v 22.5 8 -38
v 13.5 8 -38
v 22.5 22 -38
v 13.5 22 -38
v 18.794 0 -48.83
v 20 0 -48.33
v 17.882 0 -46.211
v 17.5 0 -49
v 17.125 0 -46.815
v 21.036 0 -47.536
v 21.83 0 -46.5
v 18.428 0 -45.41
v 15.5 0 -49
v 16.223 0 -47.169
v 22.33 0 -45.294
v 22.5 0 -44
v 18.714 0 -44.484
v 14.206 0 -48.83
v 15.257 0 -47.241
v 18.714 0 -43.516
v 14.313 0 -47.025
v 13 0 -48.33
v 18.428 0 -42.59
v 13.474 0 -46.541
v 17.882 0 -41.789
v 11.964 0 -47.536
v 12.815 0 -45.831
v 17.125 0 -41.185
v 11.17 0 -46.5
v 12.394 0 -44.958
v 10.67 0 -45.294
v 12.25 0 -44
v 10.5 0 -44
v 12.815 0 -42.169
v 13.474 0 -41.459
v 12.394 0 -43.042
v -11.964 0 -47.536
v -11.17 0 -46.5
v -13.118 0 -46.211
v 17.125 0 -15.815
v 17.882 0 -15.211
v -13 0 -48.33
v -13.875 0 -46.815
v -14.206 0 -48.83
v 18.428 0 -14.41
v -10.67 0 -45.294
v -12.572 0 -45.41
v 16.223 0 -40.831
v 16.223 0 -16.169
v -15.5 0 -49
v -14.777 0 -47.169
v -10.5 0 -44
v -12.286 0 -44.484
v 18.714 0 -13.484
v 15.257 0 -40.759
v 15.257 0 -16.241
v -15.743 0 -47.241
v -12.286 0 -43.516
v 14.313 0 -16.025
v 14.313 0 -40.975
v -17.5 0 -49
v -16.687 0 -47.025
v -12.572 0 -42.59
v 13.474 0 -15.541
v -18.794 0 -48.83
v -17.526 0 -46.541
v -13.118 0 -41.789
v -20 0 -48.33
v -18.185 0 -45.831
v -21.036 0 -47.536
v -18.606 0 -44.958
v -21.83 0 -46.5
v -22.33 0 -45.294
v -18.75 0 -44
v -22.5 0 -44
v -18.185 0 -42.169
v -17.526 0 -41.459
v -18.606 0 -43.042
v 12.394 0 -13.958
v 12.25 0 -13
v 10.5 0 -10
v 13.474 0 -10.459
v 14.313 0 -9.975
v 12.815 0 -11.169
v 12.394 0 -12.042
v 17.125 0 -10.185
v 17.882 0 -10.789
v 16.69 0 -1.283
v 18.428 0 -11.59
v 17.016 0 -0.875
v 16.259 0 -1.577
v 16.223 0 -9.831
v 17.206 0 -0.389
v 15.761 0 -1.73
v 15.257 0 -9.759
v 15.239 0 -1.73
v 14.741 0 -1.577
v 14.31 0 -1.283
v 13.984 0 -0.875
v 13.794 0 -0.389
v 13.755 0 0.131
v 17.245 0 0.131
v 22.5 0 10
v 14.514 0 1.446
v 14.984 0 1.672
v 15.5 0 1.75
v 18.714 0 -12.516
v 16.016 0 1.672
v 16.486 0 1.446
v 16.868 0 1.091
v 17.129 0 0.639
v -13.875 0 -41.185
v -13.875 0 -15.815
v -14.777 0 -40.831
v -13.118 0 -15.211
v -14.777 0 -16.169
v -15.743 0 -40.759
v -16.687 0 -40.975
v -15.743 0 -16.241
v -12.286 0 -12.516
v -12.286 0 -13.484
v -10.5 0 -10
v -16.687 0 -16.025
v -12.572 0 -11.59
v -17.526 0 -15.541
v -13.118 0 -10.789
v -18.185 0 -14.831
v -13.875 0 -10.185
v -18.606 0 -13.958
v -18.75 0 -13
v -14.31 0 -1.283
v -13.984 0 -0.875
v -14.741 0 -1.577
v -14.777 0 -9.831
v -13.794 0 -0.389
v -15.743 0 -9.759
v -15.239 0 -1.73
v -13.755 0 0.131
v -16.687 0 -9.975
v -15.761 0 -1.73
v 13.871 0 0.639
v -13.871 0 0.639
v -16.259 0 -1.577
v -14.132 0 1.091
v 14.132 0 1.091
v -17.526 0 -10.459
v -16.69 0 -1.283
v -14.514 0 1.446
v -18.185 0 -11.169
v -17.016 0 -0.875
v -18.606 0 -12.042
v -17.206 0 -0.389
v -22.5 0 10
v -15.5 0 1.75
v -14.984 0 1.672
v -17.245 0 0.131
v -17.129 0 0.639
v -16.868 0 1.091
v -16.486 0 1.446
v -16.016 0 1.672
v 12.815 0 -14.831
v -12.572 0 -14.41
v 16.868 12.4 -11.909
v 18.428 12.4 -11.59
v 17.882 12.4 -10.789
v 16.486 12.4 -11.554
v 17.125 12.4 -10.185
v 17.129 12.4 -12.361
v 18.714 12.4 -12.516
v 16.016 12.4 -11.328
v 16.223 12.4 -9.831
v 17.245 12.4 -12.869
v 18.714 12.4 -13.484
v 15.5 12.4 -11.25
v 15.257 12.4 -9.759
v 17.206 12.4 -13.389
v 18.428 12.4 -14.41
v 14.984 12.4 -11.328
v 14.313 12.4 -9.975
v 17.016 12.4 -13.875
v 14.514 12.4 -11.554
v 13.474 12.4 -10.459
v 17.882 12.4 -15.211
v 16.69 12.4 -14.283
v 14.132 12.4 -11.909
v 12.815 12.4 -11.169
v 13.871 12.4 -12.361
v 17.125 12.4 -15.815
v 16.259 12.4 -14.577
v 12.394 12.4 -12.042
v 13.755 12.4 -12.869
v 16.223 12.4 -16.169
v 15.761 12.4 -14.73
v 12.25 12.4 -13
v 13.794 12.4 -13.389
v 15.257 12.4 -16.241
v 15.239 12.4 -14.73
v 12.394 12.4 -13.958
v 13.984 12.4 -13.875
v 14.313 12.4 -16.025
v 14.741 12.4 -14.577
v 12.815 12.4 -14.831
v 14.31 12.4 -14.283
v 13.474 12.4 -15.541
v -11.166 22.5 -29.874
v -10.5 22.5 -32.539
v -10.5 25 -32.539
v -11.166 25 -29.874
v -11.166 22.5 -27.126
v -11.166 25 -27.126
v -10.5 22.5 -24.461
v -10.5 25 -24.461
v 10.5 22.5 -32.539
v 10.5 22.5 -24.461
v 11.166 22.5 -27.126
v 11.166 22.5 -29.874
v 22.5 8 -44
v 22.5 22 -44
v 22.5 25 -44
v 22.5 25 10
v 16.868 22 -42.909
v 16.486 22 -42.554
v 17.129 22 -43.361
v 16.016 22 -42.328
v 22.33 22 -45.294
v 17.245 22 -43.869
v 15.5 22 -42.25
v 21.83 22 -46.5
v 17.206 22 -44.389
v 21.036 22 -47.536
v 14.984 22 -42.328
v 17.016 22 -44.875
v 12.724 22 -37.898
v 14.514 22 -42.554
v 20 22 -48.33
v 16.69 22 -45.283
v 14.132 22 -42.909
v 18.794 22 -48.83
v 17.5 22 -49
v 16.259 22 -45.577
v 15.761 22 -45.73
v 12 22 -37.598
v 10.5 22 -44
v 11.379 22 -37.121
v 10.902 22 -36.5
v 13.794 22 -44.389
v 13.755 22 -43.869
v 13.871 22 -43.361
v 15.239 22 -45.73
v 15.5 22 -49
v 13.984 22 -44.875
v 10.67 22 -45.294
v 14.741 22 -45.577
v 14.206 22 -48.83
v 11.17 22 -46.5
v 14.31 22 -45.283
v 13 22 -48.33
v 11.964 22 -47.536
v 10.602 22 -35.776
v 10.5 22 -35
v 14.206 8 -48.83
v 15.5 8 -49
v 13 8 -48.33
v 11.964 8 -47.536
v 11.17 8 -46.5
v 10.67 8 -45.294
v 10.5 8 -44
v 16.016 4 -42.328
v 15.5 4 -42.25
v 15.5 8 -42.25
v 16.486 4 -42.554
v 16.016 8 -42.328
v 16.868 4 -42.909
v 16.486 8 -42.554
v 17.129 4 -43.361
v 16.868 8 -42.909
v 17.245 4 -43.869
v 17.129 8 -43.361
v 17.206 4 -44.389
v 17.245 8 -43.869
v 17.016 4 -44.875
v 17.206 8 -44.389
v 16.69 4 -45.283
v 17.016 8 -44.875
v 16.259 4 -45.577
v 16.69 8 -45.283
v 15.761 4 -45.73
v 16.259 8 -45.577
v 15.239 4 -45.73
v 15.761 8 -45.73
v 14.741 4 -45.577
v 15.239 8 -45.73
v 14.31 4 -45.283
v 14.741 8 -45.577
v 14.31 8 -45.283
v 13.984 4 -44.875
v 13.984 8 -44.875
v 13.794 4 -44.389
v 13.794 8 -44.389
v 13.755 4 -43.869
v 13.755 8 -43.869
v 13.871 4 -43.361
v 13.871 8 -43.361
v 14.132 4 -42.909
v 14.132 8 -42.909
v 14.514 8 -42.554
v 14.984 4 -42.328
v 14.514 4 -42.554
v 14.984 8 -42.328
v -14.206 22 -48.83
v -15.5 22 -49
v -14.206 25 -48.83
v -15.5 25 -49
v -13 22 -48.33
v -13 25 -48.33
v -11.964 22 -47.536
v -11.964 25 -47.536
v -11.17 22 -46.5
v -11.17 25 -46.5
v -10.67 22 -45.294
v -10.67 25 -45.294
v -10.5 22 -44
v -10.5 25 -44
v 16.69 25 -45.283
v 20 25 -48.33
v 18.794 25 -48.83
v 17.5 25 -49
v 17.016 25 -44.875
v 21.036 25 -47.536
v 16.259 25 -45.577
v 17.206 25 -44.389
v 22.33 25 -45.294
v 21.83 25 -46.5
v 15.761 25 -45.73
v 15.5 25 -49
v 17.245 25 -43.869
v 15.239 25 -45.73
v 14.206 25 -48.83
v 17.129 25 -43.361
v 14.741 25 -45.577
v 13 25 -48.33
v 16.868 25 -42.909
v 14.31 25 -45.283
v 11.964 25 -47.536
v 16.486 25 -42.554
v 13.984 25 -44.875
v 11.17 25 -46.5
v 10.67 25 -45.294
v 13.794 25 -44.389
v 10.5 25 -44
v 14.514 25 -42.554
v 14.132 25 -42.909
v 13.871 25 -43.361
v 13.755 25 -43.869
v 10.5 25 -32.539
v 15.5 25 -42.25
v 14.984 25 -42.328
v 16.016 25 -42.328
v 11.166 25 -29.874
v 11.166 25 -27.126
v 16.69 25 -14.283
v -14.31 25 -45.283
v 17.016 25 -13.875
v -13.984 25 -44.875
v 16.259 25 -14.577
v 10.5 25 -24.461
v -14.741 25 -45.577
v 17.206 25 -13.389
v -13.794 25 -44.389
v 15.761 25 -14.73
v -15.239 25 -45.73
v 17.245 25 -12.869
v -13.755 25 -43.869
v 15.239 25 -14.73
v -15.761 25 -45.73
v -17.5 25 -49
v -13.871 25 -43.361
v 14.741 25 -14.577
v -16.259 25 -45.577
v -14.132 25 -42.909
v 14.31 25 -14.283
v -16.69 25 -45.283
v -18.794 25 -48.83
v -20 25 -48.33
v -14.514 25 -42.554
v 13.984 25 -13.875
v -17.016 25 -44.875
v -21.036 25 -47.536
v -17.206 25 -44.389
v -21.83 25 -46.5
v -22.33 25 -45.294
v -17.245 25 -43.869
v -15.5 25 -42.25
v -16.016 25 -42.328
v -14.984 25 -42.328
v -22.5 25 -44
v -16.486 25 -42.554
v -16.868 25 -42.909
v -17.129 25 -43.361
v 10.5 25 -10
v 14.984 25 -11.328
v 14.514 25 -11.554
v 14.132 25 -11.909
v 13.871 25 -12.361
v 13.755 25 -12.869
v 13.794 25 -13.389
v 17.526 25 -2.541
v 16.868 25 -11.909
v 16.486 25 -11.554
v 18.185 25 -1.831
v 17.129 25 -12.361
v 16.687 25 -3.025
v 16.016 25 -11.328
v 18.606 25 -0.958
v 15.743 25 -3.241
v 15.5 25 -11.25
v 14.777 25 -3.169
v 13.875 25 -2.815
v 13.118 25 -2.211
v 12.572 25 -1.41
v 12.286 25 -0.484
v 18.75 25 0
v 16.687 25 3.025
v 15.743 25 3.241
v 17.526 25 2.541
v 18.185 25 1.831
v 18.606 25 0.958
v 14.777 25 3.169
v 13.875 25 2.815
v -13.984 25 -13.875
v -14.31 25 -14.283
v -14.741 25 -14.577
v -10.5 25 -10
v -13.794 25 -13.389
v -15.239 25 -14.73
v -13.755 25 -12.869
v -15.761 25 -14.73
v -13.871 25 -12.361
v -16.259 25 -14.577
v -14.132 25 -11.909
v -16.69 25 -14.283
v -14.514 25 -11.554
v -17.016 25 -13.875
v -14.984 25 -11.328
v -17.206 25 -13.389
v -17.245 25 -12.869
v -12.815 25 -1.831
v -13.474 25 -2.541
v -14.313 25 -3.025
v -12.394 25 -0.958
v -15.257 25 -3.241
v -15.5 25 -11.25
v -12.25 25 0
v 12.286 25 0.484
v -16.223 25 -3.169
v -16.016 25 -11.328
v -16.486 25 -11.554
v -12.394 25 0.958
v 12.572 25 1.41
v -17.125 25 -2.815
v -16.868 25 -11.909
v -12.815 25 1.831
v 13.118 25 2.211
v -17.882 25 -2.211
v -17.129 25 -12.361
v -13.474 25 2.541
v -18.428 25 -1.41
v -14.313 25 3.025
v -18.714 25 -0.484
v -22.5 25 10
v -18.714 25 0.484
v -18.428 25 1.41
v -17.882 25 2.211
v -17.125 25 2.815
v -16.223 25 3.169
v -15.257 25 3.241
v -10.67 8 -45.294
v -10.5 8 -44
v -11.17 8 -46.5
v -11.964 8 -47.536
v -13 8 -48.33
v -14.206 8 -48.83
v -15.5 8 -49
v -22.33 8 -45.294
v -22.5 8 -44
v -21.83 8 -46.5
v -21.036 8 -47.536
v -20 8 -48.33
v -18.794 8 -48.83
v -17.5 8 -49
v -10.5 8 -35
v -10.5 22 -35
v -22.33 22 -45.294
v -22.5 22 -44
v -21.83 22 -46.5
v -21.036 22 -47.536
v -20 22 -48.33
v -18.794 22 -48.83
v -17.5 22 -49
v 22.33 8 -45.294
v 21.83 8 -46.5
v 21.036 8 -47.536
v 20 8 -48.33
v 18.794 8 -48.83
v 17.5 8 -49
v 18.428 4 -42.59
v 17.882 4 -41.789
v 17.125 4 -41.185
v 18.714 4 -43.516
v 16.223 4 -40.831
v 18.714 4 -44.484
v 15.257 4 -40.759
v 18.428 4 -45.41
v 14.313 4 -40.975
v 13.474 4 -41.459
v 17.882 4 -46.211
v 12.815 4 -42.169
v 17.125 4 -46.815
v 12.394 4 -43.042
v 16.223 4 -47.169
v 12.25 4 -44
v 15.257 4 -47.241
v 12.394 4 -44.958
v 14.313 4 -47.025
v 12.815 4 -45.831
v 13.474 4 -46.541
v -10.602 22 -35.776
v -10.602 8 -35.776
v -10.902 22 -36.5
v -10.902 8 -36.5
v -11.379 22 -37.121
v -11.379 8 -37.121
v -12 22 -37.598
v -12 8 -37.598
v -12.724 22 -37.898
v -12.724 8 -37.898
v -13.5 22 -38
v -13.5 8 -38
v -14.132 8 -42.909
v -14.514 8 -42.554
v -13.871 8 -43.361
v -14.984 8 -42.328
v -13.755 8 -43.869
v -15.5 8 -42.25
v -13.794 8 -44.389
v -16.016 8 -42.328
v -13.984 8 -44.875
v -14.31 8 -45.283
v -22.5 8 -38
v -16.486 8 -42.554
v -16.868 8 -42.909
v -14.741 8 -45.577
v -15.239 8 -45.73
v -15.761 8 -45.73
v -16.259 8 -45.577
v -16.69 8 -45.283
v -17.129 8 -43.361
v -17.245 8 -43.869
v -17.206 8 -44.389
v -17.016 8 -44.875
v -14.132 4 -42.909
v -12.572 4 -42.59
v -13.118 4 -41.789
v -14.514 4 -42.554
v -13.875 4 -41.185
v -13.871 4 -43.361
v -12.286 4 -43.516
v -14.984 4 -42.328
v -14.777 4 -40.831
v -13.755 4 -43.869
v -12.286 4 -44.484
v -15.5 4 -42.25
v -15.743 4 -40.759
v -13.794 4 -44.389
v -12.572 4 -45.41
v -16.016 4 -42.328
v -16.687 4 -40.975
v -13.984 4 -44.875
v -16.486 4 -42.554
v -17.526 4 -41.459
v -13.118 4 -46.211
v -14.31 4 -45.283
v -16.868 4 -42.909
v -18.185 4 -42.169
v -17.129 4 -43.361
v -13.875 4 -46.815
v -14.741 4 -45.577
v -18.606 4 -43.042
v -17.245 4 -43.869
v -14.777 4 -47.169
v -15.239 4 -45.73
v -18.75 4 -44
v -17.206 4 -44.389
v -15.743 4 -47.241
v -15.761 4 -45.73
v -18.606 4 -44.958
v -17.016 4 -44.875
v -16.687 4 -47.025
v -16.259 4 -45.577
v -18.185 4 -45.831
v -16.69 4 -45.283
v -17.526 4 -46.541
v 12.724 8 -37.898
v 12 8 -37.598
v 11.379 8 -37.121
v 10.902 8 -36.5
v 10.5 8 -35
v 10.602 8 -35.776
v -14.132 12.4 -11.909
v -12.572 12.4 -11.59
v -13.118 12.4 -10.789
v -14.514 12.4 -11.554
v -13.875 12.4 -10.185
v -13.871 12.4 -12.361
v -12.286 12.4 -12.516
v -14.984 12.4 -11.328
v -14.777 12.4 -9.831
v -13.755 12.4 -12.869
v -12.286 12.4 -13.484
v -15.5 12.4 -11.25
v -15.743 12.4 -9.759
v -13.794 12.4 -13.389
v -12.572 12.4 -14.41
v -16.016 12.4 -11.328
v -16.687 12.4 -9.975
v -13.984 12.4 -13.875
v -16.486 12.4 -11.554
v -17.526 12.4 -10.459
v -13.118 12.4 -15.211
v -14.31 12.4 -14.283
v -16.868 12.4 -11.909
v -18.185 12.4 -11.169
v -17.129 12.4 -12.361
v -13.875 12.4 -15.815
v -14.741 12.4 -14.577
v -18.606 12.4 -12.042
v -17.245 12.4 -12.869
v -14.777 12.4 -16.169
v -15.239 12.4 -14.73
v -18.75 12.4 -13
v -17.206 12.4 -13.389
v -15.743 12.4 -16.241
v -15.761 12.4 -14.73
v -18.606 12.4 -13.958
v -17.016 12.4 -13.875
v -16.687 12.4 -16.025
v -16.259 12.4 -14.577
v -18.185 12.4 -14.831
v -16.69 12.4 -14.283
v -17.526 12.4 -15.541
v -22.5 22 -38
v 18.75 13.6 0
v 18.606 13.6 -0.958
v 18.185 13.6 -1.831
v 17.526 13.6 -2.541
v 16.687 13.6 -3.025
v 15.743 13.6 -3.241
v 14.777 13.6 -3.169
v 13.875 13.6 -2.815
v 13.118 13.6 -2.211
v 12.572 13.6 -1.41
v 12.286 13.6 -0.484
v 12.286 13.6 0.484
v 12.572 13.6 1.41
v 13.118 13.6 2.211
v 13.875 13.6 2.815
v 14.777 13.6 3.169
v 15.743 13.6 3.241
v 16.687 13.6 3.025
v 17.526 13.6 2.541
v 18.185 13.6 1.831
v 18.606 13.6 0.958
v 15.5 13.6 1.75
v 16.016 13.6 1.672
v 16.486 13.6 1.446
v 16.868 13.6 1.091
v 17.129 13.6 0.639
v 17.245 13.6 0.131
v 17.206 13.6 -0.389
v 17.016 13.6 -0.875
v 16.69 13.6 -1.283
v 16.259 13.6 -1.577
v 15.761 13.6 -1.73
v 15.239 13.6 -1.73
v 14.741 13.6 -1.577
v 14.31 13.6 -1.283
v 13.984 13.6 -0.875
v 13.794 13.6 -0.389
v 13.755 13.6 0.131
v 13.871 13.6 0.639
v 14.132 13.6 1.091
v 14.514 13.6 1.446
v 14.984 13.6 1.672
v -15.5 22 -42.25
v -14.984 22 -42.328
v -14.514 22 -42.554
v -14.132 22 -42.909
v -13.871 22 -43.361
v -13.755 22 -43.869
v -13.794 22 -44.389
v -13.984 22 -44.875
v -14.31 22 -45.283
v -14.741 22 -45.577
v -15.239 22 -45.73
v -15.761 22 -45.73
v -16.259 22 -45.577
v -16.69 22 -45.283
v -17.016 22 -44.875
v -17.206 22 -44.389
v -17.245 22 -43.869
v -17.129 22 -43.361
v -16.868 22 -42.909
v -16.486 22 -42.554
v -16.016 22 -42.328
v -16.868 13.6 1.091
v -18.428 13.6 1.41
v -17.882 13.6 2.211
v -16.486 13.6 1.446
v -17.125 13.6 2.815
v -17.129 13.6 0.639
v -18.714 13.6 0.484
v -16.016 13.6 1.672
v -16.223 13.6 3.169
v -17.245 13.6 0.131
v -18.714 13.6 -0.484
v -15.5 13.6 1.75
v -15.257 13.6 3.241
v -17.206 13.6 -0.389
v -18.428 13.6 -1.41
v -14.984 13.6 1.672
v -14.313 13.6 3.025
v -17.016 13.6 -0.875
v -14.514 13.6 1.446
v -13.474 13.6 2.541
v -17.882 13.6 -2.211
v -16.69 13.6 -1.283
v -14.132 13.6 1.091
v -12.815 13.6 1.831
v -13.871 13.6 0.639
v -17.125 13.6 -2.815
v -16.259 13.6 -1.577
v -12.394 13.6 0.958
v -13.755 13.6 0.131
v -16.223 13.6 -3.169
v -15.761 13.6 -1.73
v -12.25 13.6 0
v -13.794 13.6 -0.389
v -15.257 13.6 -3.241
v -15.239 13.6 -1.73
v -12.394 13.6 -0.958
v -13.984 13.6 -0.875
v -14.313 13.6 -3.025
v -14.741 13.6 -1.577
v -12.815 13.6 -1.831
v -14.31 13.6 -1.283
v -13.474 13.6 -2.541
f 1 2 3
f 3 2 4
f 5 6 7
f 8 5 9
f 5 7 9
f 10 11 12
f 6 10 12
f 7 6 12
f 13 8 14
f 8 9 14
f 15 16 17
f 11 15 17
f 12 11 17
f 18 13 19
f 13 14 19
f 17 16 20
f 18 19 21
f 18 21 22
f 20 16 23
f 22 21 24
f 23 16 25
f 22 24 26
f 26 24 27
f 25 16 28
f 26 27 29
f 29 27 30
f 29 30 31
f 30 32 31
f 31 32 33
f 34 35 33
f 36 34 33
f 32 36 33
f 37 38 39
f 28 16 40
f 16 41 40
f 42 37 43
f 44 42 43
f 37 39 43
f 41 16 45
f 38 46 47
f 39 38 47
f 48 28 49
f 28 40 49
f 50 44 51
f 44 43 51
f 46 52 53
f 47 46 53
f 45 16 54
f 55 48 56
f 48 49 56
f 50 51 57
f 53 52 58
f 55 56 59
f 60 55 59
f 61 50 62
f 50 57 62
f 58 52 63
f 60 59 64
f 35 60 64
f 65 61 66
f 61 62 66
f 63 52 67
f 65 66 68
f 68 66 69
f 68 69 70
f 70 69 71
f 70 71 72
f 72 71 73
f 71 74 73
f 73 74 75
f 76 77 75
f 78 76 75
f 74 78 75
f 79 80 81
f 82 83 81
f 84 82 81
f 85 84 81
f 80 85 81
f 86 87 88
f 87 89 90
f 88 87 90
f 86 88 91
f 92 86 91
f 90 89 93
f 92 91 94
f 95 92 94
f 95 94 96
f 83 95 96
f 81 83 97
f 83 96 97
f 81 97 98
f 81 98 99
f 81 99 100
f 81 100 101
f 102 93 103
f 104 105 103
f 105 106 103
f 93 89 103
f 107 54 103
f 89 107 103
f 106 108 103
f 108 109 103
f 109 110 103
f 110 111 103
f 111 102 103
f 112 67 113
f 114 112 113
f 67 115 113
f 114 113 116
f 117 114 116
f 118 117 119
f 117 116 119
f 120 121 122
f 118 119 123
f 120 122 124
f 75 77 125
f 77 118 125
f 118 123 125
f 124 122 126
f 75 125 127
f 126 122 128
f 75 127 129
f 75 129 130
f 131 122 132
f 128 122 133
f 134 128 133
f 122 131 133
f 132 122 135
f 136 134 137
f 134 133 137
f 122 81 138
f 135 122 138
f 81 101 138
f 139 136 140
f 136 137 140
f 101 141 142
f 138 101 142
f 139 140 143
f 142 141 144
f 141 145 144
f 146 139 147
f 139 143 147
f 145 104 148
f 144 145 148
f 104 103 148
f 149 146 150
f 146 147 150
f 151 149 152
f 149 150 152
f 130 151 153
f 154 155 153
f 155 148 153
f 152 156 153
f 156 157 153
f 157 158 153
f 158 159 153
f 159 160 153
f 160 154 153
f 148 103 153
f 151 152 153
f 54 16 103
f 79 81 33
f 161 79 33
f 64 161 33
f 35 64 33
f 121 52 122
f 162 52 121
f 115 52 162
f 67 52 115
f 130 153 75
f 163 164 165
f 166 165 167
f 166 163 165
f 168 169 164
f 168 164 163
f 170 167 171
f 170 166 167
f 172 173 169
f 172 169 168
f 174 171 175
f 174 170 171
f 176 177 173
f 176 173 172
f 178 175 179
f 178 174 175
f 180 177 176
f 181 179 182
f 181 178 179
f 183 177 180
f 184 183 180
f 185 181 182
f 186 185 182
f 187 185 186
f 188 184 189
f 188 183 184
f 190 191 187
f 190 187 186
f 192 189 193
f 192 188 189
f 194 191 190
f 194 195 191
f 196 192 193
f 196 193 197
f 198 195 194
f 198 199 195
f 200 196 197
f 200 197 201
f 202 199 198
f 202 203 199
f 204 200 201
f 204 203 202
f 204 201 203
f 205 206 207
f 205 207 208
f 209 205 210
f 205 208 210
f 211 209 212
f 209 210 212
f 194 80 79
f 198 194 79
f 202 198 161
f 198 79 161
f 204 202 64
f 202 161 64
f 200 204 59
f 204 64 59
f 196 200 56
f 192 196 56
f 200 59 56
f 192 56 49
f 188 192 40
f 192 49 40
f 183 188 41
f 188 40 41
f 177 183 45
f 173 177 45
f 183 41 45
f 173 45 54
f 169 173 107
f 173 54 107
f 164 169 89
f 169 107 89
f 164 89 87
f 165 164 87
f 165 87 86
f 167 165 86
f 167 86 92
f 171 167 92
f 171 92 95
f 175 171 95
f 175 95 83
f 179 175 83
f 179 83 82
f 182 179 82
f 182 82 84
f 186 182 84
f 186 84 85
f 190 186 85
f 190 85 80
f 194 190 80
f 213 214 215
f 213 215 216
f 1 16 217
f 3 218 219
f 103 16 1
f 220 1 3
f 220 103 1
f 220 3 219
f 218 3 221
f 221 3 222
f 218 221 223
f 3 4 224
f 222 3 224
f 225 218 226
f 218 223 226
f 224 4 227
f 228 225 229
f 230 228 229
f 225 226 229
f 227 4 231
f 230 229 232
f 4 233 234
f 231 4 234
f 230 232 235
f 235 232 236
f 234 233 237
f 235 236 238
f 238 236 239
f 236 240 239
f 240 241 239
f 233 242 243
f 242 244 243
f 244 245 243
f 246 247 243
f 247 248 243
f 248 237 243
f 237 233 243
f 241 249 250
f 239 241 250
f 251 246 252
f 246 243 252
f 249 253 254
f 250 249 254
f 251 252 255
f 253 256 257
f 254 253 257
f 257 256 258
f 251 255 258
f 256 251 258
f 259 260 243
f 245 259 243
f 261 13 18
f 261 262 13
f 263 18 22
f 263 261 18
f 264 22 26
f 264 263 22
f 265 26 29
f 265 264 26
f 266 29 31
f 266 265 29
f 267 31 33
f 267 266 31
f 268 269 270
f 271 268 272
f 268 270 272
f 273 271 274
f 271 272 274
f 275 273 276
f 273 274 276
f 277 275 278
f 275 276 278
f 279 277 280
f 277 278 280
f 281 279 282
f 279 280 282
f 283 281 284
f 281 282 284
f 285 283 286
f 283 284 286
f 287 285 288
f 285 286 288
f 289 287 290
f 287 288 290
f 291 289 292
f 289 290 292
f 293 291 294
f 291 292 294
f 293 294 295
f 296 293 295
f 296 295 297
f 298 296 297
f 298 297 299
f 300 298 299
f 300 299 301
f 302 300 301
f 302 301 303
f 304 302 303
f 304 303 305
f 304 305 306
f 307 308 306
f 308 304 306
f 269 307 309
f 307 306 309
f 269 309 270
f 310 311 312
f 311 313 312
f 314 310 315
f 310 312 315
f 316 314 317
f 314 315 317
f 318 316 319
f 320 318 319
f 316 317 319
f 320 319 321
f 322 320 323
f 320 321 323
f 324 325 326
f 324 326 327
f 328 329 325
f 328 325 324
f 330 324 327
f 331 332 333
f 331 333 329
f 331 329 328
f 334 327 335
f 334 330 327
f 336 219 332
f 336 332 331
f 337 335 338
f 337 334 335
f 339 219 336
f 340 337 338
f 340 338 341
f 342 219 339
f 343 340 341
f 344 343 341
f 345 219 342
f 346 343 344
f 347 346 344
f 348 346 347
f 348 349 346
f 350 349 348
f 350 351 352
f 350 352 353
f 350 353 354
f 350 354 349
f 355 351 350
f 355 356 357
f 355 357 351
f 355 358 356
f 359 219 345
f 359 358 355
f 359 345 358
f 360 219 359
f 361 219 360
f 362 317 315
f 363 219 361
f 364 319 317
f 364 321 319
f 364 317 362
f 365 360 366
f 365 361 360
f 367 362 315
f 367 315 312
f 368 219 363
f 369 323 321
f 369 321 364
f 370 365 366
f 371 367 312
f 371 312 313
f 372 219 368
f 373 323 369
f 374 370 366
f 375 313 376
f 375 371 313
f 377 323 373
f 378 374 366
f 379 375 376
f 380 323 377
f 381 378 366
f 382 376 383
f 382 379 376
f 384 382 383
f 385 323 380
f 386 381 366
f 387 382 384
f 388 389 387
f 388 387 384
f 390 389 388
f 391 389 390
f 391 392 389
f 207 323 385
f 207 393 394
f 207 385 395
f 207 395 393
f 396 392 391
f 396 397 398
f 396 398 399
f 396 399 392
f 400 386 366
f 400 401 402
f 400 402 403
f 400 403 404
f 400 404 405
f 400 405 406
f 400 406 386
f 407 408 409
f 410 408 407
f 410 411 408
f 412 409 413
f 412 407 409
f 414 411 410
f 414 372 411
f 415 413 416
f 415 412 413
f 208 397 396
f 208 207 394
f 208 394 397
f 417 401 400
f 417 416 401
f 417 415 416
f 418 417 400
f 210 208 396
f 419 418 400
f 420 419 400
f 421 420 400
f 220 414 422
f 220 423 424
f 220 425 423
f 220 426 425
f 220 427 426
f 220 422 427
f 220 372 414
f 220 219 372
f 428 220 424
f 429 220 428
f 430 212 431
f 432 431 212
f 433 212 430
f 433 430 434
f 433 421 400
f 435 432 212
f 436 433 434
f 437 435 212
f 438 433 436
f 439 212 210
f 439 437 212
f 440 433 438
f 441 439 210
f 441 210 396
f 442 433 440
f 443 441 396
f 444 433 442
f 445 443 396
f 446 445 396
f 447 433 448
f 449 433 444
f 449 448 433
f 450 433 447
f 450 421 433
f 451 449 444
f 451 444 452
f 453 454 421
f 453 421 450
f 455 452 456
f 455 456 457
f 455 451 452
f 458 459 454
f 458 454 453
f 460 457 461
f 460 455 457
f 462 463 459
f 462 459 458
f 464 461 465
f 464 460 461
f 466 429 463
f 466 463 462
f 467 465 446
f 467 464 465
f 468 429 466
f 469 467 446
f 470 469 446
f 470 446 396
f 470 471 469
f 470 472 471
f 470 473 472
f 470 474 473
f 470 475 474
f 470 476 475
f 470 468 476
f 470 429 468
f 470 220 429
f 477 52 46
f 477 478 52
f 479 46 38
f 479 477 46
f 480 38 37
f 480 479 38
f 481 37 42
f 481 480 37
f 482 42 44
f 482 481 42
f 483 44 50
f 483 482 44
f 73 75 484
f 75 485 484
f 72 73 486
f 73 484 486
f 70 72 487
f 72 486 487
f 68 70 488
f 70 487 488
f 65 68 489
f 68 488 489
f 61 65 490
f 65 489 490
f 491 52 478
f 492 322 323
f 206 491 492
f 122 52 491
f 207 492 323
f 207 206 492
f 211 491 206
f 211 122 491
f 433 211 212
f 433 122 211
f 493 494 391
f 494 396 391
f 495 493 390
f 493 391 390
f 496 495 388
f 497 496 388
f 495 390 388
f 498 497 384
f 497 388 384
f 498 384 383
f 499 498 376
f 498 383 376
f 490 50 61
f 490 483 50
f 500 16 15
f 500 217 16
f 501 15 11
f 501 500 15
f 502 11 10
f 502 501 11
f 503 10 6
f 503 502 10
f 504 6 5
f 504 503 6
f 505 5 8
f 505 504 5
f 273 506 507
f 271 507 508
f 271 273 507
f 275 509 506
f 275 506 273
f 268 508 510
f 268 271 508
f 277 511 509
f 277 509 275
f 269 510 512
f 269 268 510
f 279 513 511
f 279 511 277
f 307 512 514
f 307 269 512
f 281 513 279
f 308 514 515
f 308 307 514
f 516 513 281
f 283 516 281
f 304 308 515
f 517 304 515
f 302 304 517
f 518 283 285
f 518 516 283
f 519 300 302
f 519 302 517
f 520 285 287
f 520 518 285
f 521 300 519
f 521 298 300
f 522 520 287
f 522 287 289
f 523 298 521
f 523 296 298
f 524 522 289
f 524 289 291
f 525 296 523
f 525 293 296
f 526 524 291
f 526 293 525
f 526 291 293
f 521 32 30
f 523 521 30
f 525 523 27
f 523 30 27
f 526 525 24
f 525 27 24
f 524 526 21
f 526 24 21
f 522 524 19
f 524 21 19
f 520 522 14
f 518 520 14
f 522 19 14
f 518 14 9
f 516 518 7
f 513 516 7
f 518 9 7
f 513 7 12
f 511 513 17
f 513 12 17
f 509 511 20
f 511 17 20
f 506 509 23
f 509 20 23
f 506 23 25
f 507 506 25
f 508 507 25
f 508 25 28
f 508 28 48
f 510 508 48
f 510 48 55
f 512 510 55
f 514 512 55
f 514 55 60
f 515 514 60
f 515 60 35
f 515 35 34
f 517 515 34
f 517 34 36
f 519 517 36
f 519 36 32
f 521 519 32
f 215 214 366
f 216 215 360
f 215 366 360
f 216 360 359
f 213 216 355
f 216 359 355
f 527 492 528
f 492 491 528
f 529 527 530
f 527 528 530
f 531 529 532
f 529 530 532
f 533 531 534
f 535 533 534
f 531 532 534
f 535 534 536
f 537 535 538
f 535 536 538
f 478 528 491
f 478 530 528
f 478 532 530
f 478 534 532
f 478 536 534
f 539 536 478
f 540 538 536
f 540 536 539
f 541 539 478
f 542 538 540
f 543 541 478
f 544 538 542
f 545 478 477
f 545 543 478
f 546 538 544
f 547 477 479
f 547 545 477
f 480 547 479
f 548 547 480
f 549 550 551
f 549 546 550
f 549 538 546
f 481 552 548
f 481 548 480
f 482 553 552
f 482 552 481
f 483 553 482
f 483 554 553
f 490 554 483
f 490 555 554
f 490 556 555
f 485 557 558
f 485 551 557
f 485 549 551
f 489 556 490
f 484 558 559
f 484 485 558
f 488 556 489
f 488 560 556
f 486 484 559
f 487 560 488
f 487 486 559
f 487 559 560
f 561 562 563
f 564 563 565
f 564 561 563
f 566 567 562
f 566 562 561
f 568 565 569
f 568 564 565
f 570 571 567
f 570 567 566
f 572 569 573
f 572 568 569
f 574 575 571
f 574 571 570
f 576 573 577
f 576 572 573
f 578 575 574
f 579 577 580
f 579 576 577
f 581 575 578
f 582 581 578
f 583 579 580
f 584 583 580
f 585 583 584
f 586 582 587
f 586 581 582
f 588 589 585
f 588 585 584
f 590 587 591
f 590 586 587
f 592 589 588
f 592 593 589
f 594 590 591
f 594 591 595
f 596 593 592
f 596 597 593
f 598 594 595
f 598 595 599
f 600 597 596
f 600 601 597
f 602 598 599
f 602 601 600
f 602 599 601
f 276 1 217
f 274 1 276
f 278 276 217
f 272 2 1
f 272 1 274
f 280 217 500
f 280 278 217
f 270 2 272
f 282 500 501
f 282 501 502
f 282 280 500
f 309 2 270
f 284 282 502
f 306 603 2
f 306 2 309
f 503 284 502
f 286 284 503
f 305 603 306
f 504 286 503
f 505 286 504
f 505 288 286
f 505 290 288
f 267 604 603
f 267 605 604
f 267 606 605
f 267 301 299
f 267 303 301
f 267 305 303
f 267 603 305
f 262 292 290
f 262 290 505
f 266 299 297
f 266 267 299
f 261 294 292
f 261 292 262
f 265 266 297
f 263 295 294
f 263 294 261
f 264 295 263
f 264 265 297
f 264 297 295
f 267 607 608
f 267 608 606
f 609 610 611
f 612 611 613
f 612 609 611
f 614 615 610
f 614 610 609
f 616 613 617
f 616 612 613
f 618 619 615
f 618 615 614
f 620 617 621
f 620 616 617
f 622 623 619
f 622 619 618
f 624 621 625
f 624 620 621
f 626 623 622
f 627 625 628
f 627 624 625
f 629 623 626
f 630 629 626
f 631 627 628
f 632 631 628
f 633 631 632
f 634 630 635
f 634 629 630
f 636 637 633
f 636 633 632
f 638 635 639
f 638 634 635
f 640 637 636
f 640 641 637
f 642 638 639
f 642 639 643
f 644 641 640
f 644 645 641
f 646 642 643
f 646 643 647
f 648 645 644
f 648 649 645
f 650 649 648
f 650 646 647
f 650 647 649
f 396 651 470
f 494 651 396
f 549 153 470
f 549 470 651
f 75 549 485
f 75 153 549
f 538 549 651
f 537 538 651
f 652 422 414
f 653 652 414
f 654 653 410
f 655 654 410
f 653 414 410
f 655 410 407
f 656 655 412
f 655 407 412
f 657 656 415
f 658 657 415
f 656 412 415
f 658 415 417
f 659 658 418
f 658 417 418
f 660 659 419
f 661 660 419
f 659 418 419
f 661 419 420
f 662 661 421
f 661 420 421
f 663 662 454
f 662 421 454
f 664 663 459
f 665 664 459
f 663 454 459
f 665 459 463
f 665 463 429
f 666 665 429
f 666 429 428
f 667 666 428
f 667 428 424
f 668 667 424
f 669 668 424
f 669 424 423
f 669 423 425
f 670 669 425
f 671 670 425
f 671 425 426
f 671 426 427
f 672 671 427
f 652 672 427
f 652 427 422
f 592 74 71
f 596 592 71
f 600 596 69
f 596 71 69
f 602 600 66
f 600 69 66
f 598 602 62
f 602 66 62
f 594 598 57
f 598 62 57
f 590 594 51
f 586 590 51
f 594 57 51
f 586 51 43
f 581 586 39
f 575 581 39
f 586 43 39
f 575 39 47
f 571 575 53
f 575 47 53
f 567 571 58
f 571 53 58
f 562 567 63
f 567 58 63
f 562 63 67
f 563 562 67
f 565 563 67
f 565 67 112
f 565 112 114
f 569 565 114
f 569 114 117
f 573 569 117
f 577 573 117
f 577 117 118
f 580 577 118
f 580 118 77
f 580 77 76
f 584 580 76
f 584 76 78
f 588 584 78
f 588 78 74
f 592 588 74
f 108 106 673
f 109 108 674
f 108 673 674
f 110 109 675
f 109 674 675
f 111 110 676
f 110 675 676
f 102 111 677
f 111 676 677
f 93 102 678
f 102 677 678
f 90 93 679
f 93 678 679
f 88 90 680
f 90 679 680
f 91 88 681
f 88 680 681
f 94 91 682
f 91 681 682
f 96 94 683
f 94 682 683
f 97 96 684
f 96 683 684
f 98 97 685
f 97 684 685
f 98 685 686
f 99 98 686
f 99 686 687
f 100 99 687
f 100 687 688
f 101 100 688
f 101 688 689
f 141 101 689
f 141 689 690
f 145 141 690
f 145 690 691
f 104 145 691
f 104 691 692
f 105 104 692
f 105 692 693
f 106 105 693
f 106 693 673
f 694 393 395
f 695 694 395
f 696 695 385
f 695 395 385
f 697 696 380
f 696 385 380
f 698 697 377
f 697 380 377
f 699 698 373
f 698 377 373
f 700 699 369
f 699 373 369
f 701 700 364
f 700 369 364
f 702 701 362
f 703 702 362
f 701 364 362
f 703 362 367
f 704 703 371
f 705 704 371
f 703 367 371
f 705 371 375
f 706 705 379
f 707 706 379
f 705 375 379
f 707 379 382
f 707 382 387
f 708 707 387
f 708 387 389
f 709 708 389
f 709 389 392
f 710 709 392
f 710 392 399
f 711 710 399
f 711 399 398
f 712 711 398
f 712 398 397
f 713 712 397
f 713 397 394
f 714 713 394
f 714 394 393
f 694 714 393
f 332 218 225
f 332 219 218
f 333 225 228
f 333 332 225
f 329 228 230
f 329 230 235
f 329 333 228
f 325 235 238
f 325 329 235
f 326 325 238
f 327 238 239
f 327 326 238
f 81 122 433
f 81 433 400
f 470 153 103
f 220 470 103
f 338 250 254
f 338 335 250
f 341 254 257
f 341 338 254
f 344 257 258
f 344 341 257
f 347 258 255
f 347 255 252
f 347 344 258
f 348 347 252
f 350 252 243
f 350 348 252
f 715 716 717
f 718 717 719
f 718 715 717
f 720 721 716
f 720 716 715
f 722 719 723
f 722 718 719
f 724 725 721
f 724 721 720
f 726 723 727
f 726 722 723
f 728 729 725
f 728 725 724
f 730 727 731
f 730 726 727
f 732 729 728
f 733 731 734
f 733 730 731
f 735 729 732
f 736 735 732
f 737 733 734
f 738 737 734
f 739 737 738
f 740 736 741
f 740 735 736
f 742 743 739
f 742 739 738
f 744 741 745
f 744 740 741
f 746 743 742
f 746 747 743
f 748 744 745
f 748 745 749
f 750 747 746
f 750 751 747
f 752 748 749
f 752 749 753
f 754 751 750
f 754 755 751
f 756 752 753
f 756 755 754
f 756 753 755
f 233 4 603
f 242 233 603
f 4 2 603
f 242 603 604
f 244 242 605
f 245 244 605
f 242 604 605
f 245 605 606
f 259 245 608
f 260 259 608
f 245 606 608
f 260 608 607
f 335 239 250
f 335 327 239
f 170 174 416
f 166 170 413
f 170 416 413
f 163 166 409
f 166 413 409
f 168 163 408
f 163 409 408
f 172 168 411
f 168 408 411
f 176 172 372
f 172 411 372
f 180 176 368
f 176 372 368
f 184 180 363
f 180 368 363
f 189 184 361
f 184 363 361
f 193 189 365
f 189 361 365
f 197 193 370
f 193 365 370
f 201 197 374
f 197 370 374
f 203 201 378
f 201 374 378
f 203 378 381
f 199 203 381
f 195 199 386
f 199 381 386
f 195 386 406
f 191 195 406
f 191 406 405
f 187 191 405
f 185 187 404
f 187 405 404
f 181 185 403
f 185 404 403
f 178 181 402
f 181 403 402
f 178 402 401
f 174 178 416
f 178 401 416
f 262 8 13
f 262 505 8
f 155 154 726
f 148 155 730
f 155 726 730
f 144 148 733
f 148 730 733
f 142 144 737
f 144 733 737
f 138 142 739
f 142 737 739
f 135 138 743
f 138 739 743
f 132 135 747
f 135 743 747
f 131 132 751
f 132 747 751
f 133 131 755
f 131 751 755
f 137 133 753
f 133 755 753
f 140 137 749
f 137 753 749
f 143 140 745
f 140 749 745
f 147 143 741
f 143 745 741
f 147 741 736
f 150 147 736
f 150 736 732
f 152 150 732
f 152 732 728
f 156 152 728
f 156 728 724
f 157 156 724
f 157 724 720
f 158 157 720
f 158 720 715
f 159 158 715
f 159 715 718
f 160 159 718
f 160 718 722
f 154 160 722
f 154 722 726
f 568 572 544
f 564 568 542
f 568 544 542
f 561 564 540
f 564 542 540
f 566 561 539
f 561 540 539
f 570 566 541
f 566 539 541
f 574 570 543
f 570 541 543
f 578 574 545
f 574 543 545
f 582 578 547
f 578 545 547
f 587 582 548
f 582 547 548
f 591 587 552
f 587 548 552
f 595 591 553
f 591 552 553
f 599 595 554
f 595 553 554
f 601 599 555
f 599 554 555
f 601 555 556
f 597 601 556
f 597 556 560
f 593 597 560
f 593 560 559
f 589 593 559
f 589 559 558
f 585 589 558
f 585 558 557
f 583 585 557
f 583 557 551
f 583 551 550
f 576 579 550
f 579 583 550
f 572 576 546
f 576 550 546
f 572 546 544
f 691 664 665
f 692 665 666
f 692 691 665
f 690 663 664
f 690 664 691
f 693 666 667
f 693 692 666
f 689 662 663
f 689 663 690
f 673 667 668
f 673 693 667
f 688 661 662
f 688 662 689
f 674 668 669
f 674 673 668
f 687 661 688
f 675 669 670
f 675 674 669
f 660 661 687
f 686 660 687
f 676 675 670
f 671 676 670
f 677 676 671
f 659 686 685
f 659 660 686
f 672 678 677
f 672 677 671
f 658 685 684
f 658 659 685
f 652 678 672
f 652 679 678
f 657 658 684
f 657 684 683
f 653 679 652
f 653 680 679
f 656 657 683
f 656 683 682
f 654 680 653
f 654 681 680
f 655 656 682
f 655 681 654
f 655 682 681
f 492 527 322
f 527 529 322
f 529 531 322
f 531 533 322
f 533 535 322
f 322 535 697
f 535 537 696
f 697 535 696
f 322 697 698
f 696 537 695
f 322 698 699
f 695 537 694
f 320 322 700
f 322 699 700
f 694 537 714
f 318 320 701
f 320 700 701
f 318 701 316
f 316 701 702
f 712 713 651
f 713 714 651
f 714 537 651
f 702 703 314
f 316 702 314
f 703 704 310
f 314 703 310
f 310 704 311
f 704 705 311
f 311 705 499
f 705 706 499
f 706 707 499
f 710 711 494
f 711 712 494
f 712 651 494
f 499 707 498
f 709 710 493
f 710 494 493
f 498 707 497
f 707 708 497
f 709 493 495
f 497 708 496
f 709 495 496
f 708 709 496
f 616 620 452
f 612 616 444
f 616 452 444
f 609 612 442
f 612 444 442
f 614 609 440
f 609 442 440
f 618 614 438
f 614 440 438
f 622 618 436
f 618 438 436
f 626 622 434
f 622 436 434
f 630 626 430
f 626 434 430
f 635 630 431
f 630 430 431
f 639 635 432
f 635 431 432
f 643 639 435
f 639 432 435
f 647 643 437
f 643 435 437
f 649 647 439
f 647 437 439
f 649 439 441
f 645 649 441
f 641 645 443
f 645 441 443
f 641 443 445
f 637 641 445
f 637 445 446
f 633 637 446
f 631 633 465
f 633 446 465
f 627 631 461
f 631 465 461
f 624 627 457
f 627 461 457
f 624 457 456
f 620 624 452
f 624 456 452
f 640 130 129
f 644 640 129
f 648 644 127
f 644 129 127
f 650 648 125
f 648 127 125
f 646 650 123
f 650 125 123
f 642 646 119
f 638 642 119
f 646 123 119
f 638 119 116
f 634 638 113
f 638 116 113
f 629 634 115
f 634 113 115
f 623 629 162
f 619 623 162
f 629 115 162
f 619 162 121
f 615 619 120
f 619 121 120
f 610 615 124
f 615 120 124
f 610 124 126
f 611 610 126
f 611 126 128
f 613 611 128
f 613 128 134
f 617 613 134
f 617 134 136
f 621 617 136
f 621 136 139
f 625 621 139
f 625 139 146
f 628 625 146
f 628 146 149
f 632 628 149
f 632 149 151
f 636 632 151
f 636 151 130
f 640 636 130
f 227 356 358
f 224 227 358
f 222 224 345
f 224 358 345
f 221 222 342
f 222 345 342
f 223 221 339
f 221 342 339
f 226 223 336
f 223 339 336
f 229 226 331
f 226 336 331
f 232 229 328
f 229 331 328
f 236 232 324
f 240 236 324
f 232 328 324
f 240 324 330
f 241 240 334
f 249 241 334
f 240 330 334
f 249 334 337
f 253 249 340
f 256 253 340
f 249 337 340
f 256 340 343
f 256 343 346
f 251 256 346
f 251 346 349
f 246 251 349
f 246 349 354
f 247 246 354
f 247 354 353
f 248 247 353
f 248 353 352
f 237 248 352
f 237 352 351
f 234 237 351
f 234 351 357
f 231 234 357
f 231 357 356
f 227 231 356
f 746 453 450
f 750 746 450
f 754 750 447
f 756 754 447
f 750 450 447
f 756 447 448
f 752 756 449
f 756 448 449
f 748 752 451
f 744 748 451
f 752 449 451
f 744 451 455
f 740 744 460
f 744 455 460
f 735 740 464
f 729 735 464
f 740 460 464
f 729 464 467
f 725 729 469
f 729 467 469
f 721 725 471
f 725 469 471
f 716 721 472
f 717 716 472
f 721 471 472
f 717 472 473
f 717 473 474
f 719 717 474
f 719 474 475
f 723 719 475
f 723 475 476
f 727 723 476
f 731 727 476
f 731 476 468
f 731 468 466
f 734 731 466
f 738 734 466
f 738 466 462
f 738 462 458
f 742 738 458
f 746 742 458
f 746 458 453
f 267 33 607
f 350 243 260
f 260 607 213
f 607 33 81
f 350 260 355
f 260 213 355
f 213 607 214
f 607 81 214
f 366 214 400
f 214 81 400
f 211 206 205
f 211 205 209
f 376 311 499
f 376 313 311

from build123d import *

# Parameters (mm, degrees)
SKETCH1_W                                           = 45
SKETCH1_H                                           = 20
BOSS_EXTRUDE1_DEPTH                                 = 25
SKETCH2_W                                           = 12
SKETCH2_H                                           = 25
BOSS_EXTRUDE2_DEPTH                                 = 40
SKETCH3_R                                           = 1.75
CUT_EXTRUDE1_DEPTH                                  = 61.259853966
SKETCH4_R                                           = 1.75
CUT_EXTRUDE2_DEPTH                                  = 25
CBORE_FOR_M3_HEX_SOCKET_HEAD_CAP_SCREW1_D           = 3.5
CBORE_FOR_M3_HEX_SOCKET_HEAD_CAP_SCREW1_CBORE_D     = 6.5
CBORE_FOR_M3_HEX_SOCKET_HEAD_CAP_SCREW1_CBORE_DEPTH = 11.4
CBORE_FOR_M3_HEX_SOCKET_HEAD_CAP_SCREW2_D           = 3.5
CBORE_FOR_M3_HEX_SOCKET_HEAD_CAP_SCREW2_CBORE_D     = 6.5
CBORE_FOR_M3_HEX_SOCKET_HEAD_CAP_SCREW2_CBORE_DEPTH = 4
CBORE_FOR_M3_PAN_HEAD_SCREW1_D                      = 3.5
CBORE_FOR_M3_PAN_HEAD_SCREW1_CBORE_D                = 6.5
CBORE_FOR_M3_PAN_HEAD_SCREW1_CBORE_DEPTH            = 12.4
CUT_EXTRUDE3_DEPTH                                  = 72.763500472
CUT_EXTRUDE3_DEPTH_BACK                             = 72.763500472
SKETCH9_W                                           = 12
SKETCH9_H                                           = 14
SKETCH10_W                                          = 12
SKETCH10_H                                          = 8
SKETCH10_H_2                                        = 3
CUT_EXTRUDE5_DEPTH                                  = 1
FILLET2_R                                           = 5
FILLET5_R                                           = 3
SKETCH13_R                                          = 11.25
CUT_EXTRUDE6_DEPTH                                  = 2.5


with BuildPart() as part:
    # Sketch1 → Boss-Extrude1 (new body)
    with BuildSketch(Plane(origin=(0, 0, 0), x_dir=(1, 0, 0), z_dir=(0, 1, 0))):
        Rectangle(SKETCH1_W, SKETCH1_H)
    extrude(amount=BOSS_EXTRUDE1_DEPTH)

    # Sketch2 → Boss-Extrude2 (add)
    with BuildSketch(Plane(origin=(0, 0, -10), x_dir=(-1, 0, 0), z_dir=(0, 0, -1))):
        with Locations((-16.5, 12.5)):
            Rectangle(SKETCH2_W, SKETCH2_H)
        with Locations((16.5, 12.5)):
            Rectangle(SKETCH2_W, SKETCH2_H)
    extrude(amount=BOSS_EXTRUDE2_DEPTH)

    # Sketch3 → Cut-Extrude1 (cut, through all)
    with BuildSketch(Plane(origin=(0, 25, 0), x_dir=(1, 0, 0), z_dir=(0, 1, 0))):
        with Locations(Location((15.5, 44, 0), (0, 0, 270))):
            Circle(SKETCH3_R)
        with Locations(Location((15.5, 13, 0), (0, 0, 270))):
            Circle(SKETCH3_R)
        with Locations(Location((-15.5, 13, 0), (0, 0, 270))):
            Circle(SKETCH3_R)
        with Locations(Location((-15.5, 44, 0), (0, 0, 270))):
            Circle(SKETCH3_R)
    extrude(amount=-CUT_EXTRUDE1_DEPTH, mode=Mode.SUBTRACT)

    # Sketch4 → Cut-Extrude2 (cut)
    with BuildSketch(Plane(origin=(0, 25, 0), x_dir=(1, 0, 0), z_dir=(0, 1, 0))):
        with Locations(Location((-15.5, 0, 0), (0, 0, 270))):
            Circle(SKETCH4_R)
        with Locations(Location((15.5, 0, 0), (0, 0, 270))):
            Circle(SKETCH4_R)
    extrude(amount=-CUT_EXTRUDE2_DEPTH, mode=Mode.SUBTRACT)

    # CBORE for M3 Hex Socket Head Cap Screw1 (through all)
    with Locations(Plane(origin=(0, 25, 0), x_dir=(1, 0, 0), z_dir=(0, 1, 0))):
        with Locations((15.5, 0), (-15.5, 0)):
            CounterBoreHole(CBORE_FOR_M3_HEX_SOCKET_HEAD_CAP_SCREW1_D / 2, CBORE_FOR_M3_HEX_SOCKET_HEAD_CAP_SCREW1_CBORE_D / 2, CBORE_FOR_M3_HEX_SOCKET_HEAD_CAP_SCREW1_CBORE_DEPTH)

    # CBORE for M3 Hex Socket Head Cap Screw2 (through all)
    with Locations(Plane(origin=(0, 0, 0), x_dir=(-1, 0, 0), z_dir=(0, -1, 0))):
        with Locations((15.5, 44), (15.5, 13), (-15.5, 13), (-15.5, 44)):
            CounterBoreHole(CBORE_FOR_M3_HEX_SOCKET_HEAD_CAP_SCREW2_D / 2, CBORE_FOR_M3_HEX_SOCKET_HEAD_CAP_SCREW2_CBORE_D / 2, CBORE_FOR_M3_HEX_SOCKET_HEAD_CAP_SCREW2_CBORE_DEPTH)

    # CBORE for M3 Pan Head Screw1 (through all)
    with Locations(Plane(origin=(0, 0, 0), x_dir=(-1, 0, 0), z_dir=(0, -1, 0))):
        with Locations((-15.5, 13), (15.5, 13)):
            CounterBoreHole(CBORE_FOR_M3_PAN_HEAD_SCREW1_D / 2, CBORE_FOR_M3_PAN_HEAD_SCREW1_CBORE_D / 2, CBORE_FOR_M3_PAN_HEAD_SCREW1_CBORE_DEPTH)

    # Sketch9 → Cut-Extrude3 (cut, two sides: drawn at the far end of the back side and taken through both)
    with BuildSketch(Plane(origin=(22.5, 0, 0), x_dir=(0, 0, -1), z_dir=(1, 0, 0)).offset(-CUT_EXTRUDE3_DEPTH_BACK)):
        with Locations((44, 15)):
            Rectangle(SKETCH9_W, SKETCH9_H)
    extrude(amount=CUT_EXTRUDE3_DEPTH + CUT_EXTRUDE3_DEPTH_BACK, mode=Mode.SUBTRACT)

    # Sketch10 → Cut-Extrude5 (cut)
    with BuildSketch(Plane(origin=(0, 0, -50), x_dir=(-1, 0, 0), z_dir=(0, 0, -1))):
        with Locations((-16.5, 4)):
            Rectangle(SKETCH10_W, SKETCH10_H)
        with Locations((16.5, 4)):
            Rectangle(SKETCH10_W, SKETCH10_H)
        with Locations((-16.5, 23.5)):
            Rectangle(SKETCH10_W, SKETCH10_H_2)
        with Locations((16.5, 23.5)):
            Rectangle(SKETCH10_W, SKETCH10_H_2)
    extrude(amount=-CUT_EXTRUDE5_DEPTH, mode=Mode.SUBTRACT)

    # Fillet2
    fillet2_edges = [part.edges().sort_by_distance(p)[0] for p in [
        (-10.5, 4, -49),
        (-22.5, 4, -49),
        (22.5, 23.5, -49),
        (10.5, 23.5, -49),
        (-10.5, 23.5, -49),
        (-22.5, 23.5, -49),
        (22.5, 4, -49),
        (10.5, 4, -49),
    ]]
    fillet(fillet2_edges, radius=FILLET2_R)

    # Fillet5
    fillet5_edges = [part.edges().sort_by_distance(p)[0] for p in [
        (-10.5, 15, -38),
        (10.5, 15, -38),
    ]]
    fillet(fillet5_edges, radius=FILLET5_R)

    # Sketch13 → Cut-Extrude6 (cut)
    with BuildSketch(Plane(origin=(0, 25, 0), x_dir=(1, 0, 0), z_dir=(0, 1, 0))):
        with Locations((0, 28.5)):
            Circle(SKETCH13_R)
    extrude(amount=-CUT_EXTRUDE6_DEPTH, mode=Mode.SUBTRACT)


solid = part.part
